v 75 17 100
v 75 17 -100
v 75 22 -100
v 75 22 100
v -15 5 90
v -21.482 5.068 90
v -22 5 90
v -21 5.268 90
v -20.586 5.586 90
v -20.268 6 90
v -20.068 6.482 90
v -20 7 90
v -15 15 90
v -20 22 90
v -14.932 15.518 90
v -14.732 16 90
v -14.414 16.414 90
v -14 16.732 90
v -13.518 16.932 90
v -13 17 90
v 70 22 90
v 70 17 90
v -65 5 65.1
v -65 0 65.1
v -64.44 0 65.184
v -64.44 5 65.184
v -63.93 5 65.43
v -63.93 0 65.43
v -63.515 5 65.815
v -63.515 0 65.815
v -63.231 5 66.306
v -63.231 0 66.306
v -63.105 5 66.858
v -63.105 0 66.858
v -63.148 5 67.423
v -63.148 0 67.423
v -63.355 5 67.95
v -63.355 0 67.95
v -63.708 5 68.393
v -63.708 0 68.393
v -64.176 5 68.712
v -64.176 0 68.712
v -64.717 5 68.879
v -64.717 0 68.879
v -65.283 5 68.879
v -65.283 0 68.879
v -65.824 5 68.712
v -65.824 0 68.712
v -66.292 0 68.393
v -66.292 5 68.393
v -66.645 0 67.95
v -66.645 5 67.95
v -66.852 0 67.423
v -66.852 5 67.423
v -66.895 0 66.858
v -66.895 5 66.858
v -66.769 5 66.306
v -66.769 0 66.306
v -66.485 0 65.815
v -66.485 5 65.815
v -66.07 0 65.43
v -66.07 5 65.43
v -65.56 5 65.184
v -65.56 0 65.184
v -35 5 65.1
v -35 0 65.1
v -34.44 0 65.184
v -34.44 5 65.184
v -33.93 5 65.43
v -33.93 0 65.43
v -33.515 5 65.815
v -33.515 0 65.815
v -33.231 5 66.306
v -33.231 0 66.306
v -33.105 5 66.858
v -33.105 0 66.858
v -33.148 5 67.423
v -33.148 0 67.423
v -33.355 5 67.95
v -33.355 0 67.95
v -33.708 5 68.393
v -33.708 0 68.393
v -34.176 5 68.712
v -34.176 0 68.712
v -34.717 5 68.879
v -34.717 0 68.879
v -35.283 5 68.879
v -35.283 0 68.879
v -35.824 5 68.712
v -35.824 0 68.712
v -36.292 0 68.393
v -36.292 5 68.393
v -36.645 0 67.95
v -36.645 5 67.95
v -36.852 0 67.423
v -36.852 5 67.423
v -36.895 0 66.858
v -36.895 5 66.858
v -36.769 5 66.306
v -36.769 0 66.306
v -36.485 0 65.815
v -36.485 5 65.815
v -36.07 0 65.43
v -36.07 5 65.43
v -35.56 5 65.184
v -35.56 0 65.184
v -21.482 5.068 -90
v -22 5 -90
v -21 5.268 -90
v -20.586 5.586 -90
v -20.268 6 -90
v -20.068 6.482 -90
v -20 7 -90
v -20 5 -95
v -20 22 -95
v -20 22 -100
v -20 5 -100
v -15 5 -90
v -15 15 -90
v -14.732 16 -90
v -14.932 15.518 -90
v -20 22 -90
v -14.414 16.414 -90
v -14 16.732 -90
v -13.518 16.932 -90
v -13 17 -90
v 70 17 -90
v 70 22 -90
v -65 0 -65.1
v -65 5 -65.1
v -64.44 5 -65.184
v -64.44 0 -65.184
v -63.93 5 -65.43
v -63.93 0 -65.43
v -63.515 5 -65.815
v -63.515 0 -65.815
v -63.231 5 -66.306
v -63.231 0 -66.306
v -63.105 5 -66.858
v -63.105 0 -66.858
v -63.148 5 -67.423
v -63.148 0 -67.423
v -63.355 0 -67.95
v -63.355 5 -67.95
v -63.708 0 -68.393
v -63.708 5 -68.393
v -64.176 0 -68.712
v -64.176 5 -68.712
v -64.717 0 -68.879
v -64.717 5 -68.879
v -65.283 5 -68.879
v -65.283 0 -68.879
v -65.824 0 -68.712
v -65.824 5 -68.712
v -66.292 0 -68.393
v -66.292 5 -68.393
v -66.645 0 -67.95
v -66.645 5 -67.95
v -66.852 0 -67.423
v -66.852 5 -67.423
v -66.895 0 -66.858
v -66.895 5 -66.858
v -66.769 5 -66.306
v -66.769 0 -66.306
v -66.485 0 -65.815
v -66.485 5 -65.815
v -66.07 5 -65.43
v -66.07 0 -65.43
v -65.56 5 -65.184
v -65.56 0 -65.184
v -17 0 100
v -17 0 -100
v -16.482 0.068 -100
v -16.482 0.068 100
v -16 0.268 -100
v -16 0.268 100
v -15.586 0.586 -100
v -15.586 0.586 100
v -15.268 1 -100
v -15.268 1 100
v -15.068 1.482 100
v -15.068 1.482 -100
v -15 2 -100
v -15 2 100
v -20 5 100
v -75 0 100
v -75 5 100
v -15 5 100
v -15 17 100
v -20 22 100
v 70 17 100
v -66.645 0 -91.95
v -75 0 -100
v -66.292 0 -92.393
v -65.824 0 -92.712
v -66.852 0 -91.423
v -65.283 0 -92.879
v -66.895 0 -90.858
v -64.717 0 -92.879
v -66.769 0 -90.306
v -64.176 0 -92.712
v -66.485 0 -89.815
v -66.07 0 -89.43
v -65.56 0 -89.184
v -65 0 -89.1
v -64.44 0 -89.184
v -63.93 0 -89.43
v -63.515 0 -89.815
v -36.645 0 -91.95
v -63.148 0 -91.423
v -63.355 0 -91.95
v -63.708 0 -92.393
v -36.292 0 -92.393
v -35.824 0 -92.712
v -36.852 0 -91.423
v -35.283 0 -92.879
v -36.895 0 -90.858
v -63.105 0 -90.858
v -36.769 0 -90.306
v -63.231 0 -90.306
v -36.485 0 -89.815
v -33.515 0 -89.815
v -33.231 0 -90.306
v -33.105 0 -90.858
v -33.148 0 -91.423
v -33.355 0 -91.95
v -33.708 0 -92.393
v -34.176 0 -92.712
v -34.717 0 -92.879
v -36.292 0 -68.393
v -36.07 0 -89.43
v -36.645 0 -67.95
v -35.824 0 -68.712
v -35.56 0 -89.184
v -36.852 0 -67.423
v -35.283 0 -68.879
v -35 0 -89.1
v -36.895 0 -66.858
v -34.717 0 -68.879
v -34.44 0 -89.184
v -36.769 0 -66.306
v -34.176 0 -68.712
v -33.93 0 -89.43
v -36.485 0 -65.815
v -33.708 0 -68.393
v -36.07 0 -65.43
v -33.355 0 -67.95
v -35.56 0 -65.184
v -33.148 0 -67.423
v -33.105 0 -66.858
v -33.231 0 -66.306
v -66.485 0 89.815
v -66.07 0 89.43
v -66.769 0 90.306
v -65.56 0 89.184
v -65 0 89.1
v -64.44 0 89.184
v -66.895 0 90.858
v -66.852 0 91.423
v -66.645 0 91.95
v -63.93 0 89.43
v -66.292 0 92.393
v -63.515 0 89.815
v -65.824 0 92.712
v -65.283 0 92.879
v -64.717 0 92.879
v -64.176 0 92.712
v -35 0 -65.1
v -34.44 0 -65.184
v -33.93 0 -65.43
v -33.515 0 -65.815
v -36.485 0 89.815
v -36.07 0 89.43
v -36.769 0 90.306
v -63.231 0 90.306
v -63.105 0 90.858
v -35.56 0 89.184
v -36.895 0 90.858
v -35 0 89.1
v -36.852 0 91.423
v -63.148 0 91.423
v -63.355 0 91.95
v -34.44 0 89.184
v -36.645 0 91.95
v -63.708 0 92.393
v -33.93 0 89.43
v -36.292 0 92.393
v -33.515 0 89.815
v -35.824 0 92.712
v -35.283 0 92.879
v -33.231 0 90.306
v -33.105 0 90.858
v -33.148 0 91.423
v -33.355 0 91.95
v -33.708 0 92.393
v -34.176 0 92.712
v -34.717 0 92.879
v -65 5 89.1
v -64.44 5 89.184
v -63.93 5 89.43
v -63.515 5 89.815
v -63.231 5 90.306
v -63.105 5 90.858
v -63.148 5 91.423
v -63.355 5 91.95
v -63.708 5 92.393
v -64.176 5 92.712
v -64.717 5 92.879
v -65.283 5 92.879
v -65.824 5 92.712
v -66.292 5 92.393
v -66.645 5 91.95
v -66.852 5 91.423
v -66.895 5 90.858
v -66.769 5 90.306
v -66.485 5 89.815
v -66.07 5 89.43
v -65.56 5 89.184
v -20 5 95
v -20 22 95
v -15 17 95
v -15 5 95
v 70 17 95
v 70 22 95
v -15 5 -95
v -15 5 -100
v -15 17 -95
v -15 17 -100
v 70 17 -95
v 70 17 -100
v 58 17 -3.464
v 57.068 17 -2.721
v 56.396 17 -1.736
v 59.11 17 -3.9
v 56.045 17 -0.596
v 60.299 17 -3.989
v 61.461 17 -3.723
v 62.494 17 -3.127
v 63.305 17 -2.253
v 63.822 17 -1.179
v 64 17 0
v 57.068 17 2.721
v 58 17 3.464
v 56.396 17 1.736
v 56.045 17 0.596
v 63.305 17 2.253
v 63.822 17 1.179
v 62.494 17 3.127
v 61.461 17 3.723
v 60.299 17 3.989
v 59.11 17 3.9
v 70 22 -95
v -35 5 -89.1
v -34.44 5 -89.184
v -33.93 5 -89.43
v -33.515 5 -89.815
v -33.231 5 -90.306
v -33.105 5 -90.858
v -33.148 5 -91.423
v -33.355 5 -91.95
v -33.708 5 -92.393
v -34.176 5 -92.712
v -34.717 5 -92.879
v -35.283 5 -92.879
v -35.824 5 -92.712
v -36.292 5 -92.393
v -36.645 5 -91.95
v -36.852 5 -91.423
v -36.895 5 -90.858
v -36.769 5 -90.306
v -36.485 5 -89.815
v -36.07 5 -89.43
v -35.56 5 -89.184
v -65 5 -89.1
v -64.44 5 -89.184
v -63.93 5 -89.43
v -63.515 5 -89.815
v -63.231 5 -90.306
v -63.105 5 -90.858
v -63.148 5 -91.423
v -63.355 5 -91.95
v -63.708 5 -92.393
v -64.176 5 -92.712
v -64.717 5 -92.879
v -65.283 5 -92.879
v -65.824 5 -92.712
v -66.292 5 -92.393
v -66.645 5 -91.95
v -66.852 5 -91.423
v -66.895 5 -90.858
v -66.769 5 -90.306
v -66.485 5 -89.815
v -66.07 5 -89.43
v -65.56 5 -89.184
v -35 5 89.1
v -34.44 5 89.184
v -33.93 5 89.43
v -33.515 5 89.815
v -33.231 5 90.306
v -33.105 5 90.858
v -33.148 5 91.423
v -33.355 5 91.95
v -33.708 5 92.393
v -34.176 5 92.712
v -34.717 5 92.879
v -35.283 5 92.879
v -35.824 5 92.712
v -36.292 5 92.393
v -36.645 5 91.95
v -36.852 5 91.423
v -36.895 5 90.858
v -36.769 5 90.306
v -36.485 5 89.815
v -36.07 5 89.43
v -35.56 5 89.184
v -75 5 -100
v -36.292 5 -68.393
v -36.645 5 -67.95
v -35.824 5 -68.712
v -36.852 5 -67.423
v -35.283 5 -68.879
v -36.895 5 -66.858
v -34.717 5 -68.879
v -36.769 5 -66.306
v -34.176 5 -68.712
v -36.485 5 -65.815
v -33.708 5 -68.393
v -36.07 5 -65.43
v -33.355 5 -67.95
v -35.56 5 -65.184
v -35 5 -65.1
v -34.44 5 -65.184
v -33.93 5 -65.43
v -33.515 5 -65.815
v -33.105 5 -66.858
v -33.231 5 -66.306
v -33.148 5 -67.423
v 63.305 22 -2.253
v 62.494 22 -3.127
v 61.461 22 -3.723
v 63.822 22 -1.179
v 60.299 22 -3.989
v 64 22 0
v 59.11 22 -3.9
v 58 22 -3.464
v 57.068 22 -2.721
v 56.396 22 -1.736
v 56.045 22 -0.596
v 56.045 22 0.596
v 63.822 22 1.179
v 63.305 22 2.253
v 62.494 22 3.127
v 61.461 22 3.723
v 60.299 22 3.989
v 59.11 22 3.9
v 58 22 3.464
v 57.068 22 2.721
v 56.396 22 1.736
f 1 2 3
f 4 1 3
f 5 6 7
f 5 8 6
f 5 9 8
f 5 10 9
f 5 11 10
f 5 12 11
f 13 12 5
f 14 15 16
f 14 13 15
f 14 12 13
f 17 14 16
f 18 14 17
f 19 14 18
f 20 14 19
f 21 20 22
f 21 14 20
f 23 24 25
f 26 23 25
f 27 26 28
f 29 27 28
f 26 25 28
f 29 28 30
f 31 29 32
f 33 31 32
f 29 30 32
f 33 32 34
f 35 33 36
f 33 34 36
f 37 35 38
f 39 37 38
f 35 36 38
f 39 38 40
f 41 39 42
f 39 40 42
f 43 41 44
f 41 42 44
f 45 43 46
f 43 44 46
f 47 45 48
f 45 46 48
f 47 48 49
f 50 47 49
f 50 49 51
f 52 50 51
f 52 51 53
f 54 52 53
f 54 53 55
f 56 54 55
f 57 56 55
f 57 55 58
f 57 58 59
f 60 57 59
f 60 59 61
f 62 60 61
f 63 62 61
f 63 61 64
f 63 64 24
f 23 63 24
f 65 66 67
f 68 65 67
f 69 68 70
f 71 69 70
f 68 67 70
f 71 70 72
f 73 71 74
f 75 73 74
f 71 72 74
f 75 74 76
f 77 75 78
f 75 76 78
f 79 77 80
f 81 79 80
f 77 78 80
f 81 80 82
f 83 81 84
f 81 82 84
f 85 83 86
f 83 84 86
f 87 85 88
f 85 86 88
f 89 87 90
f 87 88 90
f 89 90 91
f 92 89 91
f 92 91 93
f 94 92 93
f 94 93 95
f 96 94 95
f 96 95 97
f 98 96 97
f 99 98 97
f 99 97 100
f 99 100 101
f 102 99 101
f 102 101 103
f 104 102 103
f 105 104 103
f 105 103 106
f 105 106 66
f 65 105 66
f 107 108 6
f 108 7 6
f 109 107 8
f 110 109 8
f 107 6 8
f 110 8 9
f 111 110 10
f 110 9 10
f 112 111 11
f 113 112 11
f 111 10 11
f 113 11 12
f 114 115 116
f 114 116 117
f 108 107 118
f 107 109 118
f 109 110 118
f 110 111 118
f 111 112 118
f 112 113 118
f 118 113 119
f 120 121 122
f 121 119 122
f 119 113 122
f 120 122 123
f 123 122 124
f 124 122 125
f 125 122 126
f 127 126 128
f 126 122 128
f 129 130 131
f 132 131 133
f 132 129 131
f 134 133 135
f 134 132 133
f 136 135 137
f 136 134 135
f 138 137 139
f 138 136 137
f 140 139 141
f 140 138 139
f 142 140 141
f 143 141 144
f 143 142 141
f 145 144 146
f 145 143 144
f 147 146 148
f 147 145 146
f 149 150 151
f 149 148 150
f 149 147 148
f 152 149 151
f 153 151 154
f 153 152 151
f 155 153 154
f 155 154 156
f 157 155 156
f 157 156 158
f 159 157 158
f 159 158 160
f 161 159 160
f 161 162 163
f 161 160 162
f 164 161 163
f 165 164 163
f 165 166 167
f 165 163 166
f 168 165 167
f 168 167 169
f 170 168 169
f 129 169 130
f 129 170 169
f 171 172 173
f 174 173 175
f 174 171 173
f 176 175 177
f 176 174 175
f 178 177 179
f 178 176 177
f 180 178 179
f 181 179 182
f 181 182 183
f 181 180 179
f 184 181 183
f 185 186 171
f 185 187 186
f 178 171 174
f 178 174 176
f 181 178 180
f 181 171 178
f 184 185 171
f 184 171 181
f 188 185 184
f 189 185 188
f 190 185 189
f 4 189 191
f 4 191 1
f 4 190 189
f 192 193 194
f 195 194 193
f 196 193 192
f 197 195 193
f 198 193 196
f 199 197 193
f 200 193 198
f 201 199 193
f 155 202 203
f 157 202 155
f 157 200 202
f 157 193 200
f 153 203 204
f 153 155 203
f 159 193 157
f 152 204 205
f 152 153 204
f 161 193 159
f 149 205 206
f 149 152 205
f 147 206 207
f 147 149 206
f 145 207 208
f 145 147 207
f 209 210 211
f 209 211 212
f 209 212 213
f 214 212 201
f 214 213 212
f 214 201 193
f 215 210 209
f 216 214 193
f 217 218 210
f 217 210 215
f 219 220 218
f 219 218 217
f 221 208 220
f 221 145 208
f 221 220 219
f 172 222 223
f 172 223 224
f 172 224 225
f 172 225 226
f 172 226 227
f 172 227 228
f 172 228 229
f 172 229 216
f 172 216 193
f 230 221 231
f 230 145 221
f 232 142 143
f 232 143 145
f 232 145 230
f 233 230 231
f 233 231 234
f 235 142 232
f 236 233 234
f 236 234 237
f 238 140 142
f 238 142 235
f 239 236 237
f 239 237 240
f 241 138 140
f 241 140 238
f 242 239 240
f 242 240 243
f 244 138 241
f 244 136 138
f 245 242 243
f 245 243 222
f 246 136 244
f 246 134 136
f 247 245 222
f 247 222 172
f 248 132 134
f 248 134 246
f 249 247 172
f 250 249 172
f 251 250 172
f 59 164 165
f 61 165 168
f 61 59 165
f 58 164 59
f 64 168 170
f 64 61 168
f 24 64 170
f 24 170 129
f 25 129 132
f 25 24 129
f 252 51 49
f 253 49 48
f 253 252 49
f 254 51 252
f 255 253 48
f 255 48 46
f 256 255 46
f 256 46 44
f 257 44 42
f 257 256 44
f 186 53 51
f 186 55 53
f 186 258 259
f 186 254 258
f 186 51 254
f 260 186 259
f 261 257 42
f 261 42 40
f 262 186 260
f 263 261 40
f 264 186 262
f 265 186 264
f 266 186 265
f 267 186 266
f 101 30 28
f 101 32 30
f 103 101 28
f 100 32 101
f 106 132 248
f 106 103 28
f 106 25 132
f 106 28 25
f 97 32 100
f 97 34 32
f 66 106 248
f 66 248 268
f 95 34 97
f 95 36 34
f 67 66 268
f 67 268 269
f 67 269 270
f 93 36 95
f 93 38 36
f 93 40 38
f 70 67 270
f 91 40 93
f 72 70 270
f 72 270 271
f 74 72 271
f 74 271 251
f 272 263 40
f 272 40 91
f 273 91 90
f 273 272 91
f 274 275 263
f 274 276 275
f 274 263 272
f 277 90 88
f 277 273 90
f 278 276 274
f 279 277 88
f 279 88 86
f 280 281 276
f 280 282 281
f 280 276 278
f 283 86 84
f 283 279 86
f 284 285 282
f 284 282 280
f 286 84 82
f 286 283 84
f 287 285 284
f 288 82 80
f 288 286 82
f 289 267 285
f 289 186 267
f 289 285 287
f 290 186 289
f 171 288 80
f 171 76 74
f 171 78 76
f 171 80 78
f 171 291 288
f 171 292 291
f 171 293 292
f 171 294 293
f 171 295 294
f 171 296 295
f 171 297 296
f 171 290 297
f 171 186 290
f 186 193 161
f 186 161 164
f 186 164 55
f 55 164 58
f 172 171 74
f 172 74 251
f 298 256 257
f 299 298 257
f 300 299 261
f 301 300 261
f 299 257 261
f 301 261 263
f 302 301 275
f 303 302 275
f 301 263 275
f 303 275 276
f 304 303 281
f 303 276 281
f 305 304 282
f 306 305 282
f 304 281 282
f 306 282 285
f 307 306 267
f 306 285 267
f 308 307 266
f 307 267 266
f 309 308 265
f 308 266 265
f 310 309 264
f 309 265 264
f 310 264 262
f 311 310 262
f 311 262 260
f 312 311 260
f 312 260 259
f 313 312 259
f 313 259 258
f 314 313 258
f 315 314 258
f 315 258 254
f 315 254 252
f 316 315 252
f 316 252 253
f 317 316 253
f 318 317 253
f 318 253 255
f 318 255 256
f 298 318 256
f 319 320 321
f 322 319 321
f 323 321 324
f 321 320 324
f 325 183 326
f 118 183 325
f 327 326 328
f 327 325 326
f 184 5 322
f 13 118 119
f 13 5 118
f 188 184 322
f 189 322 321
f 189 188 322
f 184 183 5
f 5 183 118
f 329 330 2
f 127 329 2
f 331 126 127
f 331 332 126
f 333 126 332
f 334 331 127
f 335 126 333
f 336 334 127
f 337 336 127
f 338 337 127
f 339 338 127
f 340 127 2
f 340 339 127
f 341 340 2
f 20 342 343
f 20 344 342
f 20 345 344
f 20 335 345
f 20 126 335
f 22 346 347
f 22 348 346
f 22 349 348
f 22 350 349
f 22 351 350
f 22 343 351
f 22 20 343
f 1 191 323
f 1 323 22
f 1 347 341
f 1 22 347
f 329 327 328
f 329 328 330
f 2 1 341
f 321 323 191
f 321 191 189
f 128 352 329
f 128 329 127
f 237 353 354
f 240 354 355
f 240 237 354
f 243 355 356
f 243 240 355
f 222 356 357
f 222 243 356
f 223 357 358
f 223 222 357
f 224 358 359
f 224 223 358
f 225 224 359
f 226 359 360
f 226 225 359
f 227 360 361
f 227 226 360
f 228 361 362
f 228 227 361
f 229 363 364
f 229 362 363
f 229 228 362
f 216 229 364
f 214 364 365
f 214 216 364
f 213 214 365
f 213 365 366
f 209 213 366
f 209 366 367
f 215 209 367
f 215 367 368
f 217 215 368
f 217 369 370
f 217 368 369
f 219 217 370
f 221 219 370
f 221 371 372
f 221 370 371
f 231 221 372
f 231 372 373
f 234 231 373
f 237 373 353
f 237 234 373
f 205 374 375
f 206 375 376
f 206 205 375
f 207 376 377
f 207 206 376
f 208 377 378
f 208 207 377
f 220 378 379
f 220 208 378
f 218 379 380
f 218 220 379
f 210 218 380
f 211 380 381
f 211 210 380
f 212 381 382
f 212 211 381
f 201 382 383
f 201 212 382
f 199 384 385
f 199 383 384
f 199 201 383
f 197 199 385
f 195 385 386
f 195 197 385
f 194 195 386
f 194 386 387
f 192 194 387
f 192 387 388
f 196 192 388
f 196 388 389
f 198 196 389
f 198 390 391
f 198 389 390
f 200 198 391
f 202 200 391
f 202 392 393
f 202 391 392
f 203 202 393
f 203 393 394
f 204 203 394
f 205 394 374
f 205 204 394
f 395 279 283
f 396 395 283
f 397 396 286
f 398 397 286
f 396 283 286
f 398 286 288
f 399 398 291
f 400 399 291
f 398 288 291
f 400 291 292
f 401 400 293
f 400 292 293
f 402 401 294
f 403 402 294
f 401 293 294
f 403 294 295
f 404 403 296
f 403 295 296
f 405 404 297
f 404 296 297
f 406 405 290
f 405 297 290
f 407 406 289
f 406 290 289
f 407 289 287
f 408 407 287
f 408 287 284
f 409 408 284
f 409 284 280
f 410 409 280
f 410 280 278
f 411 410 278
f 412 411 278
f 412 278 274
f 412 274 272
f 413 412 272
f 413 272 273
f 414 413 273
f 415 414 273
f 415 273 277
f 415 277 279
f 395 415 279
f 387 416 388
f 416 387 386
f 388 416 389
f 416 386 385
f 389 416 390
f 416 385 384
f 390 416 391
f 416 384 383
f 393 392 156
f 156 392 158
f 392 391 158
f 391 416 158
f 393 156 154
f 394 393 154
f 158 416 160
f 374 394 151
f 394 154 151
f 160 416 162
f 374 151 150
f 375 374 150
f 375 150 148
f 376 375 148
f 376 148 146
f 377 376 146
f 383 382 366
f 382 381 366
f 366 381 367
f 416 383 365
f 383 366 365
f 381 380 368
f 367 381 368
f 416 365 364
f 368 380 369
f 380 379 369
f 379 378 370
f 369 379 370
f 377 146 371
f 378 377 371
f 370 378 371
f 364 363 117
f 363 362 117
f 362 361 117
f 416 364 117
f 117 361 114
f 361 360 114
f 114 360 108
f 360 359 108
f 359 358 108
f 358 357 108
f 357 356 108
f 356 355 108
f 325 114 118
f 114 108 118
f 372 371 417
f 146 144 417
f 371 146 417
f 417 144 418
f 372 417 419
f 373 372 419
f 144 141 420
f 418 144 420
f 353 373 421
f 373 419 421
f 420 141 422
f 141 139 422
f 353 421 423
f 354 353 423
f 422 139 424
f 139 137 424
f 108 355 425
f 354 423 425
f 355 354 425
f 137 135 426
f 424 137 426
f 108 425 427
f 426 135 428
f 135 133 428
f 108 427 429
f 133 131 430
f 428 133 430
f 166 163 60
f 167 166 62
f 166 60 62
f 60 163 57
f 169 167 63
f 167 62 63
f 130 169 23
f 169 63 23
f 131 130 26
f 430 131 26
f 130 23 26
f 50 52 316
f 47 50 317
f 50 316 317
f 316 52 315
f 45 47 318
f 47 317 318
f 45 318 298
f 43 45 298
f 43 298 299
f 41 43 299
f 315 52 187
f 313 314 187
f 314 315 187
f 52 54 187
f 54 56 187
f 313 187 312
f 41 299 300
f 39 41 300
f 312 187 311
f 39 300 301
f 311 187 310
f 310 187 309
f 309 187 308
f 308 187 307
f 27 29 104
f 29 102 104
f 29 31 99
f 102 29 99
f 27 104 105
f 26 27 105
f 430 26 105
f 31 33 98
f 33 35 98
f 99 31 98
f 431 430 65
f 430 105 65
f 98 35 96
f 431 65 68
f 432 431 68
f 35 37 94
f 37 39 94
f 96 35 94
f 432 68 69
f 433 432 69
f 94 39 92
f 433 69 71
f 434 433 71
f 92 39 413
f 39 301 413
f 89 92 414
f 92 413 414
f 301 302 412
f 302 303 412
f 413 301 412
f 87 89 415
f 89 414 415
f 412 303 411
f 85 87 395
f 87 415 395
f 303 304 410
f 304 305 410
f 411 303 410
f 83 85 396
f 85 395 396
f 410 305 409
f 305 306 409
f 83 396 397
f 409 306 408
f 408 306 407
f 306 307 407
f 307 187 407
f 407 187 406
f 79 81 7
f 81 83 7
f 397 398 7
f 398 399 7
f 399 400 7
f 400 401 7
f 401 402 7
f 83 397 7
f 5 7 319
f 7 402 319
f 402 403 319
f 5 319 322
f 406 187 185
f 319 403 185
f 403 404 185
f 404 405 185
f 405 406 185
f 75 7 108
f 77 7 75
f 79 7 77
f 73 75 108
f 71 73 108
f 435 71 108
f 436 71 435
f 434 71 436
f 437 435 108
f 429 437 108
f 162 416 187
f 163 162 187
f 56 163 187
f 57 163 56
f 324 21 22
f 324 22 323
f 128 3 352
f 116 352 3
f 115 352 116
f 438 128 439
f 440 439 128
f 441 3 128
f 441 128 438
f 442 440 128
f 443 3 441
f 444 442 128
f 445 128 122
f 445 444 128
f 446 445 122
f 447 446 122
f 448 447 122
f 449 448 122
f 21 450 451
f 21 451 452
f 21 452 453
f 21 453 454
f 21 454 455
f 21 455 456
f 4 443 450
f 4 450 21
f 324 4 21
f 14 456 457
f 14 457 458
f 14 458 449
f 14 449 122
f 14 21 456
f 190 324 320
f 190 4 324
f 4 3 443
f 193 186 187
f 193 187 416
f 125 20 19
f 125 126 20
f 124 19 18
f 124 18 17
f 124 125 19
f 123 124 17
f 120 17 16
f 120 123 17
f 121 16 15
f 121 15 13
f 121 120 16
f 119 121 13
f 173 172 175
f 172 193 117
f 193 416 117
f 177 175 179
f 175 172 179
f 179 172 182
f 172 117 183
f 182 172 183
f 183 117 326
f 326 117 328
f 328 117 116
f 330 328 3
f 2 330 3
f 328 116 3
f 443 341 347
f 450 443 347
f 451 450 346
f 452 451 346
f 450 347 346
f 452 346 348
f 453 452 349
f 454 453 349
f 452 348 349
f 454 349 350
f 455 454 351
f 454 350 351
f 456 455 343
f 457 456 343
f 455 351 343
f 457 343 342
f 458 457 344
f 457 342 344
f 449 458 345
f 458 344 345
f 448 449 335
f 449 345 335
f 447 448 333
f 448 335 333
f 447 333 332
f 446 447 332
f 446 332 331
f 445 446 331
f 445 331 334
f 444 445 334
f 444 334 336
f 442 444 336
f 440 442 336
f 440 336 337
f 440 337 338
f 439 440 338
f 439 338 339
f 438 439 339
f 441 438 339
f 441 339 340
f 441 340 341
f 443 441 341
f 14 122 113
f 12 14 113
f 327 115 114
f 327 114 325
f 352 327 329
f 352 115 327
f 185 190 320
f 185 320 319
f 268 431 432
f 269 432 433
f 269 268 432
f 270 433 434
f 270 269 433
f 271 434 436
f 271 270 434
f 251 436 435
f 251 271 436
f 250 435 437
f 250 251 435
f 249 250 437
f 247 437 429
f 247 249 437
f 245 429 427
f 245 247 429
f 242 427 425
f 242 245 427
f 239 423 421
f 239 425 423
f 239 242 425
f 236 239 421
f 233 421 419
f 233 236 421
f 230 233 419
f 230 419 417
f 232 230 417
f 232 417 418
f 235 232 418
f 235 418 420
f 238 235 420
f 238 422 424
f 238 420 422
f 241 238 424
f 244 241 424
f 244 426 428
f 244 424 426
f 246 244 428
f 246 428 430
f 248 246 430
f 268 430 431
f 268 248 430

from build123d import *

# Parameters (mm, degrees)
SKETCH1_W           = 150
SKETCH1_H           = 200
BOSS_EXTRUDE1_DEPTH = 100
SHELL2_T            = -5
SKETCH5_R           = 1.9
CUT_EXTRUDE2_DEPTH  = 10
BOSS_EXTRUDE4_DEPTH = 200
SKETCH9_W           = 101.133931545
SKETCH9_H           = 31.996148617
CUT_EXTRUDE4_DEPTH  = 236.849528301
SKETCH10_R          = 4
CUT_EXTRUDE5_DEPTH  = 10
CUT_EXTRUDE7_REACH  = 162.078
SKETCH11_W          = 140
SKETCH11_H          = 5
SKETCH15_R          = 1.2
CUT_EXTRUDE11_DEPTH = 10
SKETCH36_W          = 60
SKETCH36_H          = 5
BOSS_EXTRUDE7_DEPTH = 10
SKETCH37_R          = 3.5
CUT_EXTRUDE15_DEPTH = 60
SKETCH38_R          = 5
CUT_EXTRUDE16_DEPTH = 70
SKETCH40_W          = 179.165652401
SKETCH40_H          = 85.135231114
SKETCH40_W_2        = 87.941982163
SKETCH40_H_2        = 17
CUT_EXTRUDE18_DEPTH = 236.849528301
FILLET1_R           = 2


with BuildPart() as part:
    # Sketch1 → Boss-Extrude1 (new body)
    with BuildSketch(Plane(origin=(0, 0, 0), x_dir=(1, 0, 0), z_dir=(0, 1, 0))):
        Rectangle(SKETCH1_W, SKETCH1_H)
    extrude(amount=BOSS_EXTRUDE1_DEPTH)

    # Shell2
    shell2_openings = [part.faces().sort_by_distance(p)[0] for p in [
        (0, 50, -100),
        (0, 50, 100),
    ]]
    offset(amount=SHELL2_T, openings=shell2_openings, kind=Kind.INTERSECTION)

    # Sketch5 → Cut-Extrude2 (cut)
    with BuildSketch(Plane.XZ):
        with Locations(Location((-65, 91, 0), (0, 0, 270))):
            Circle(SKETCH5_R)
        with Locations(Location((-35, 91, 0), (0, 0, 270))):
            Circle(SKETCH5_R)
        with Locations(Location((-65, 67, 0), (0, 0, 270))):
            Circle(SKETCH5_R)
        with Locations(Location((-35, 67, 0), (0, 0, 270))):
            Circle(SKETCH5_R)
    cut_extrude2 = extrude(amount=-CUT_EXTRUDE2_DEPTH, mode=Mode.SUBTRACT)

    # Mirror2: Cut-Extrude2 across plane
    add(cut_extrude2.mirror(Plane.XY), mode=Mode.SUBTRACT)

    # Sketch8 → Boss-Extrude4 (add, through all)
    with BuildSketch(Plane.XY.offset(100)):
        Polygon((-15, 17), (75, 17), (75, 22), (-20, 22), (-20, 0), (-15, 0), align=None)
    extrude(amount=-BOSS_EXTRUDE4_DEPTH)

    # Sketch9 → Cut-Extrude4 (cut, through all)
    with BuildSketch(Plane.XY.offset(100)):
        with Locations((35.566965773, 1.001925691)):
            Rectangle(SKETCH9_W, SKETCH9_H)
    extrude(amount=-CUT_EXTRUDE4_DEPTH, mode=Mode.SUBTRACT)

    # Sketch10 → Cut-Extrude5 (cut)
    with BuildSketch(Plane.XZ.offset(-17)):
        with Locations((60, 0)):
            Circle(SKETCH10_R)
    extrude(amount=-CUT_EXTRUDE5_DEPTH, mode=Mode.SUBTRACT)

    # Cut-Extrude7: up to this face of the body (flat: up to its plane)
    cut_extrude7_end = Plane(part.part.faces().sort_by_distance((-44.954220044, 5, 0))[0])
    # Sketch11 → Cut-Extrude7 (cut, up to the picked face)
    with BuildSketch(Plane(origin=(0, 100, 0), x_dir=(1, 0, 0), z_dir=(0, 1, 0)), mode=Mode.PRIVATE) as cut_extrude7_sk1:
        with Locations((0, -92.5)):
            Rectangle(SKETCH11_W, SKETCH11_H)
    cut_extrude7_tool1 = split(extrude(cut_extrude7_sk1.sketch, amount=-CUT_EXTRUDE7_REACH, mode=Mode.PRIVATE), bisect_by=cut_extrude7_end, keep=Keep.BOTH, mode=Mode.PRIVATE)
    cut_extrude7 = cut_extrude7_tool1.solids().sort_by(Axis((0, 100, 92.5), (0, -1, 0)))[0]
    add(cut_extrude7, mode=Mode.SUBTRACT)

    # Mirror3: Cut-Extrude7 across plane
    add(cut_extrude7.mirror(Plane.XY), mode=Mode.SUBTRACT)

    # Sketch15 → Cut-Extrude11 (cut)
    with BuildSketch(Plane(origin=(0, 100, 0), x_dir=(1, 0, 0), z_dir=(0, 1, 0))):
        with Locations(Location((50, 28, 0), (0, 0, 270))):
            Circle(SKETCH15_R)
        with Locations(Location((50, -28, 0), (0, 0, 270))):
            Circle(SKETCH15_R)
        with Locations(Location((-20, 20, 0), (0, 0, 270))):
            Circle(SKETCH15_R)
        with Locations(Location((-20, -20, 0), (0, 0, 270))):
            Circle(SKETCH15_R)
    extrude(amount=-CUT_EXTRUDE11_DEPTH, mode=Mode.SUBTRACT)

    # Sketch36 → Boss-Extrude7 (add)
    with BuildSketch(Plane.ZY.offset(-70)):
        with Locations((-13.202053215, 62.5)):
            Rectangle(SKETCH36_W, SKETCH36_H)
    boss_extrude7 = extrude(amount=BOSS_EXTRUDE7_DEPTH)

    # Mirror5: Boss-Extrude7 across plane
    add(boss_extrude7.mirror(Plane(origin=(0, 0, 0), x_dir=(0, 0, 1), z_dir=(1, 0, 0))))

    # Sketch37 → Cut-Extrude15 (cut)
    with BuildSketch(Plane(origin=(75, 0, 0), x_dir=(0, 0, -1), z_dir=(1, 0, 0))):
        with Locations((0, 75)):
            Circle(SKETCH37_R)
    extrude(amount=-CUT_EXTRUDE15_DEPTH, mode=Mode.SUBTRACT)

    # Sketch38 → Cut-Extrude16 (cut)
    with BuildSketch(Plane.ZY.offset(75)):
        with Locations((0, 80)):
            Circle(SKETCH38_R)
    extrude(amount=-CUT_EXTRUDE16_DEPTH, mode=Mode.SUBTRACT)

    # Sketch40 → Cut-Extrude18 (cut, through all)
    with BuildSketch(Plane.XY.offset(100)):
        with Locations((-9.51631739, 64.567615557)):
            Rectangle(SKETCH40_W, SKETCH40_H)
        with Locations((-63.970991082, 13.5)):
            Rectangle(SKETCH40_W_2, SKETCH40_H_2)
    extrude(amount=-CUT_EXTRUDE18_DEPTH, mode=Mode.SUBTRACT)

    # Fillet1
    fillet1_edges = [part.edges().sort_by_distance(p)[0] for p in [
        (-15, 0, 0),
        (-20, 5, 0),
        (-15, 17, 0),
    ]]
    fillet(fillet1_edges, radius=FILLET1_R)


solid = part.part
